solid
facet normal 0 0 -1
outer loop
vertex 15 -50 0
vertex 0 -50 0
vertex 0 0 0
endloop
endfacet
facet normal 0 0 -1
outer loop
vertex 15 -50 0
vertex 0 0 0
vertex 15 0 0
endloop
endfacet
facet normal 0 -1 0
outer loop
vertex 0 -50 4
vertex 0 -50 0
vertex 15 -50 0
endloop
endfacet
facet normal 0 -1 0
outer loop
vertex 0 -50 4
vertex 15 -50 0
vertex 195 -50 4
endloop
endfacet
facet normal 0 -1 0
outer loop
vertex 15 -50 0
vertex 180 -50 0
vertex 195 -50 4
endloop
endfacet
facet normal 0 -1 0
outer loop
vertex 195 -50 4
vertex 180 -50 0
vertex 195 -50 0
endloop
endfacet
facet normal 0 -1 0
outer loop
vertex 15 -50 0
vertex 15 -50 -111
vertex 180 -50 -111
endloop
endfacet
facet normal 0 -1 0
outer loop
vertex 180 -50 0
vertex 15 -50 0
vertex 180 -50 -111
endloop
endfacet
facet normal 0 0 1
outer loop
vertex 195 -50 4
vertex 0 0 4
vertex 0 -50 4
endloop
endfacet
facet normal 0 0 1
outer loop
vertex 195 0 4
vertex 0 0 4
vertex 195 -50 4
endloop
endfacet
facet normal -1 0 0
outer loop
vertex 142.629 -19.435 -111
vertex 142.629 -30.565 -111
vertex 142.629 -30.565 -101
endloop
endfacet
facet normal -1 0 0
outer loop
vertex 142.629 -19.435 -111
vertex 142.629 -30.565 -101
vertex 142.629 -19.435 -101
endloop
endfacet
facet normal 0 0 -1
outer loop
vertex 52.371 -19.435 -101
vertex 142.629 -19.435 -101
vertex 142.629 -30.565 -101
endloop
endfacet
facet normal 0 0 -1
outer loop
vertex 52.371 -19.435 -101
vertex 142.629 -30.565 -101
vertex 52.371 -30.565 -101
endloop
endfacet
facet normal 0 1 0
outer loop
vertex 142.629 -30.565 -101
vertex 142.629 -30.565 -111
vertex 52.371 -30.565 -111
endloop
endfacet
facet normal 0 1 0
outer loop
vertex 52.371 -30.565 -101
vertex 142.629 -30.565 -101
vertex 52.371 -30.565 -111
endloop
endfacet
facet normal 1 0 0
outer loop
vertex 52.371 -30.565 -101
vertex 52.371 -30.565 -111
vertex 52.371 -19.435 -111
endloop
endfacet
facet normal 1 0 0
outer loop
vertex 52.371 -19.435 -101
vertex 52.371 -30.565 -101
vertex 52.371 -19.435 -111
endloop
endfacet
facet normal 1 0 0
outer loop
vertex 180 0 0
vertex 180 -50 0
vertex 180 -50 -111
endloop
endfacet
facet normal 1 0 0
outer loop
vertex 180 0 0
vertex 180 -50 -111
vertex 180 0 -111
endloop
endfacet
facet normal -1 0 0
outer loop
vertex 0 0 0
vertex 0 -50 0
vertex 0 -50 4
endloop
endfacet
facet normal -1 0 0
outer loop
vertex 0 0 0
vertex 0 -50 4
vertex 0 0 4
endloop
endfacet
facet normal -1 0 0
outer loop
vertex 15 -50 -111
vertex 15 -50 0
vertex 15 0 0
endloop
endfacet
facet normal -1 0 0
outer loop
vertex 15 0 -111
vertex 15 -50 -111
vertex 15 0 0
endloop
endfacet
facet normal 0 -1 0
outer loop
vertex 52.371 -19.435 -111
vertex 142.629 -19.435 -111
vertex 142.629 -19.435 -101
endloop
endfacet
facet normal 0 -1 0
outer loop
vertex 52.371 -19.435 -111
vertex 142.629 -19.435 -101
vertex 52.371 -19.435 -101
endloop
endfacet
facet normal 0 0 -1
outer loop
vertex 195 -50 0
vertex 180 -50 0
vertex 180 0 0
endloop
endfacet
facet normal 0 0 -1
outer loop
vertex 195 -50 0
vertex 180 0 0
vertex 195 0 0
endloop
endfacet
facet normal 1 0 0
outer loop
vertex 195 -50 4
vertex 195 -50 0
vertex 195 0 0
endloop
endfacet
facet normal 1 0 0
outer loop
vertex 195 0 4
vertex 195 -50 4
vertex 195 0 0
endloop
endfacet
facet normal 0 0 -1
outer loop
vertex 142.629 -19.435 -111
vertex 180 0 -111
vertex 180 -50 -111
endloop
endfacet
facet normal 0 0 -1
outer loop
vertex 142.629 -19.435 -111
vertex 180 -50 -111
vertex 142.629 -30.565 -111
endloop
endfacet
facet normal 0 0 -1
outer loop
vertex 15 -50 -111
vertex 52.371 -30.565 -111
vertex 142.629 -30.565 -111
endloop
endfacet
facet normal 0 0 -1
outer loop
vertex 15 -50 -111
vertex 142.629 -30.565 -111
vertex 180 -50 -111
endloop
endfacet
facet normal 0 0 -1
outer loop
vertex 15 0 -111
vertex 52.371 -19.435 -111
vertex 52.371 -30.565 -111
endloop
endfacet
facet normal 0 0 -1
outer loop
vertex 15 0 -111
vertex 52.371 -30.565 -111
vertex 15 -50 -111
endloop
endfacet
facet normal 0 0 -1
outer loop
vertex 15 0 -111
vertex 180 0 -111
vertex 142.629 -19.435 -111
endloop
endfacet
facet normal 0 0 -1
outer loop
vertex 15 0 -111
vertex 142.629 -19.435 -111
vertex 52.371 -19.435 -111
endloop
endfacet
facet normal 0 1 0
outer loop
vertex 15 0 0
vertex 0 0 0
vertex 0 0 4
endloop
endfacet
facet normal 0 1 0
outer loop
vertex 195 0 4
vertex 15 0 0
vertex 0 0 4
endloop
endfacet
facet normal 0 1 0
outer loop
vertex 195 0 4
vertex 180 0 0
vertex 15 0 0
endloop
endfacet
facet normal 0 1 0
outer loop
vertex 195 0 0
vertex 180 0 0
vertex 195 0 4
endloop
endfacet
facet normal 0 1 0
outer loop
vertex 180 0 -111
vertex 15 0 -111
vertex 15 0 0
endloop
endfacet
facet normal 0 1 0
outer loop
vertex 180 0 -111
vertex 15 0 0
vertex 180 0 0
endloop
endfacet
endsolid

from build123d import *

# Parameters (mm, degrees)
CROQUIS1_W              = 195
CROQUIS1_H              = 50
SALIENTE_EXTRUIR1_DEPTH = 4
CROQUIS2_W              = 165
CROQUIS2_H              = 50
SALIENTE_EXTRUIR2_DEPTH = 111
CROQUIS3_W              = 90.257394992
CROQUIS3_H              = 11.130396244
CORTAR_EXTRUIR1_DEPTH   = 10


with BuildPart() as part:
    # Croquis1 → Saliente-Extruir1 (new body)
    with BuildSketch(Plane.XY):
        with Locations((97.5, -25)):
            Rectangle(CROQUIS1_W, CROQUIS1_H)
    extrude(amount=SALIENTE_EXTRUIR1_DEPTH)

    # Croquis2 → Saliente-Extruir2 (add)
    with BuildSketch(Plane(origin=(0, 0, 0), x_dir=(-1, 0, 0), z_dir=(0, 0, -1))):
        with Locations((-97.5, -25)):
            Rectangle(CROQUIS2_W, CROQUIS2_H)
    extrude(amount=SALIENTE_EXTRUIR2_DEPTH)

    # Croquis3 → Cortar-Extruir1 (cut)
    with BuildSketch(Plane(origin=(0, 0, -111), x_dir=(-1, 0, 0), z_dir=(0, 0, -1))):
        with Locations((-97.5, -25)):
            Rectangle(CROQUIS3_W, CROQUIS3_H)
    extrude(amount=-CORTAR_EXTRUIR1_DEPTH, mode=Mode.SUBTRACT)


solid = part.part
